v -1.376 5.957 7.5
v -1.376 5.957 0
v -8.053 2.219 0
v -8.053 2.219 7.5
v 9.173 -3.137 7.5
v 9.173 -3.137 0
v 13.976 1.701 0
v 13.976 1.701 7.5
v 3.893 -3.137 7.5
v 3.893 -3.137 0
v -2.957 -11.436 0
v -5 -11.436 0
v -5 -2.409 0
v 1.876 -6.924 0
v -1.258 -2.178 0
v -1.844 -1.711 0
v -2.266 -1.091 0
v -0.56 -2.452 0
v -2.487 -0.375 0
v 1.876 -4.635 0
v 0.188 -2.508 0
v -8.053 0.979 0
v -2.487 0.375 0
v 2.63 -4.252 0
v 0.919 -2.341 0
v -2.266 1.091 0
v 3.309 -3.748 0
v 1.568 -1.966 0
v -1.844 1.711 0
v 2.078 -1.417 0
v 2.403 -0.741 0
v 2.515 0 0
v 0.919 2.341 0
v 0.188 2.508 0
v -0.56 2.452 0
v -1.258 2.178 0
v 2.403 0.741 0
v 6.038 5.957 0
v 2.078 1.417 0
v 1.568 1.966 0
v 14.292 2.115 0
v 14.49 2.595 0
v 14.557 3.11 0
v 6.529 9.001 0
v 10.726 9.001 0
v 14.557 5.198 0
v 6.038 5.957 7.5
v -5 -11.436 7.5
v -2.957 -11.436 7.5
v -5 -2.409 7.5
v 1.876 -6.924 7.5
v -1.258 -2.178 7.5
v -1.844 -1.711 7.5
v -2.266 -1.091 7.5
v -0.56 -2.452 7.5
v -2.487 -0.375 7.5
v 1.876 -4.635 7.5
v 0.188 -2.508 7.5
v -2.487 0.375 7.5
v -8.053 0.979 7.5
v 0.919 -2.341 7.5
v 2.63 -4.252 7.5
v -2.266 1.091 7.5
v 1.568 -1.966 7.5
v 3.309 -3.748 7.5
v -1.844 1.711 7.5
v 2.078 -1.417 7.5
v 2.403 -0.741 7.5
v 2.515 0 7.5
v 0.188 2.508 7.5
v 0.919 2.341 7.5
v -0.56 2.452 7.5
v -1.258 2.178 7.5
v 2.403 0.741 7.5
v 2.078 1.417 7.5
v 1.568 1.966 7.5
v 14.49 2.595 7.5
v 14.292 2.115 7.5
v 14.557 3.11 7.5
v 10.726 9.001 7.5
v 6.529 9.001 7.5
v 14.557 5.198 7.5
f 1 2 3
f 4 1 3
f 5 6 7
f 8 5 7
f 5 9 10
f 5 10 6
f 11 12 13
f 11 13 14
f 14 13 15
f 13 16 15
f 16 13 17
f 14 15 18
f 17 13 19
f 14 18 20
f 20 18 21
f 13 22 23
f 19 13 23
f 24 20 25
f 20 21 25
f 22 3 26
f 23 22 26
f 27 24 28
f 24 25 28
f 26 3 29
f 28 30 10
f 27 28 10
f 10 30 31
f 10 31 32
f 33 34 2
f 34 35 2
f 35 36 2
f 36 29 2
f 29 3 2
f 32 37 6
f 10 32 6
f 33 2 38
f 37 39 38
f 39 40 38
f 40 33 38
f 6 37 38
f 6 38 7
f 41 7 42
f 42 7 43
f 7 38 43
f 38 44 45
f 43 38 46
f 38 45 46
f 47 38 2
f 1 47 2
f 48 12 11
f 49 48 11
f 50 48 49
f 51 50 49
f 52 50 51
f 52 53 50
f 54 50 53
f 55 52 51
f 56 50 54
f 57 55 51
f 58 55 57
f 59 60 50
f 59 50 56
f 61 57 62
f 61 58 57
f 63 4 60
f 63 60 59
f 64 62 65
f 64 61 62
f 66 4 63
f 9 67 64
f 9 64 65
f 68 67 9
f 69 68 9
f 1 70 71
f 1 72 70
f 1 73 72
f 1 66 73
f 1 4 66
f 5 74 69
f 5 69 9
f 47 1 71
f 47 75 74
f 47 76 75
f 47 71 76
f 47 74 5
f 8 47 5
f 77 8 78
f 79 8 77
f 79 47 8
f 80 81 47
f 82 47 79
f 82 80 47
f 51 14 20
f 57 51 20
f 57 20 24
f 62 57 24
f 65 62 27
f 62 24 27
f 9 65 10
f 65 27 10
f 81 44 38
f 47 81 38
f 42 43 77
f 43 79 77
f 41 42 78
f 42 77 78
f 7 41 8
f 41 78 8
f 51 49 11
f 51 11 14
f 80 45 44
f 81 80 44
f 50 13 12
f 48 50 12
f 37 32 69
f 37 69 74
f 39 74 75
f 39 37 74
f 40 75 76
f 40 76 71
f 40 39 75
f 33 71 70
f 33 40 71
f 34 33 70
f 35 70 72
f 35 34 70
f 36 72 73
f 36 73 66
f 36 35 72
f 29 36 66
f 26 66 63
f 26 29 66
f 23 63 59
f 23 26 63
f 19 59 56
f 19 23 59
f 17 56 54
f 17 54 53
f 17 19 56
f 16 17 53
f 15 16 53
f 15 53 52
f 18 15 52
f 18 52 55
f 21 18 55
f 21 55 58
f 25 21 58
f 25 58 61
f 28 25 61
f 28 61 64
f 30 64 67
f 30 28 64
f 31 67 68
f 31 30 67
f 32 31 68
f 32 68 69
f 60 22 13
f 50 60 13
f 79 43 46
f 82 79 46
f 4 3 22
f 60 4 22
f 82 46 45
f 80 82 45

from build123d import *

# Parameters (mm, degrees)
SKETCH_1_R      = 2.515
EXTRUDE_1_DEPTH = 7.5
FILLET_1_R      = 2


with BuildPart() as part:
    # 스케치1 → 보스-돌출1 (new body)
    with BuildSketch(Plane.XY):
        with BuildLine():
            Line((-8.053143001, 0.978578295), (-5, -2.40902013))
            Line((-5, -2.40902013), (-5, -11.436332264))
            Line((-5, -11.436332264), (-2.956819065, -11.436332264))
            Line((-2.956819065, -11.436332264), (1.87605446, -6.923867857))
            Line((1.87605446, -6.923867857), (1.87605446, -4.634697365))
            ThreePointArc((1.87605446, -4.634697365), (2.980195691, -4.014776911), (3.893195608, -3.13736003))
            Line((3.893195608, -3.13736003), (9.172978659, -3.13736003))
            Line((9.172978659, -3.13736003), (14.557074242, 2.286312605))
            Line((14.557074242, 2.286312605), (14.557074242, 5.198022376))
            Line((14.557074242, 5.198022376), (10.725649804, 9.001488547))
            Line((10.725649804, 9.001488547), (6.528593017, 9.001488547))
            Line((6.528593017, 9.001488547), (6.037882178, 5.957406269))
            Line((6.037882178, 5.957406269), (-1.376355668, 5.957406269))
            Line((-1.376355668, 5.957406269), (-8.053143001, 2.219229384))
            Line((-8.053143001, 2.219229384), (-8.053143001, 0.978578295))
        make_face()
        Circle(SKETCH_1_R, mode=Mode.SUBTRACT)
    extrude(amount=EXTRUDE_1_DEPTH)

    # 필렛1
    fillet_1_edges = [part.edges().sort_by_distance(p)[0] for p in [
        (14.557074242, 2.286312605, 3.75),
    ]]
    fillet(fillet_1_edges, radius=FILLET_1_R)


solid = part.part
